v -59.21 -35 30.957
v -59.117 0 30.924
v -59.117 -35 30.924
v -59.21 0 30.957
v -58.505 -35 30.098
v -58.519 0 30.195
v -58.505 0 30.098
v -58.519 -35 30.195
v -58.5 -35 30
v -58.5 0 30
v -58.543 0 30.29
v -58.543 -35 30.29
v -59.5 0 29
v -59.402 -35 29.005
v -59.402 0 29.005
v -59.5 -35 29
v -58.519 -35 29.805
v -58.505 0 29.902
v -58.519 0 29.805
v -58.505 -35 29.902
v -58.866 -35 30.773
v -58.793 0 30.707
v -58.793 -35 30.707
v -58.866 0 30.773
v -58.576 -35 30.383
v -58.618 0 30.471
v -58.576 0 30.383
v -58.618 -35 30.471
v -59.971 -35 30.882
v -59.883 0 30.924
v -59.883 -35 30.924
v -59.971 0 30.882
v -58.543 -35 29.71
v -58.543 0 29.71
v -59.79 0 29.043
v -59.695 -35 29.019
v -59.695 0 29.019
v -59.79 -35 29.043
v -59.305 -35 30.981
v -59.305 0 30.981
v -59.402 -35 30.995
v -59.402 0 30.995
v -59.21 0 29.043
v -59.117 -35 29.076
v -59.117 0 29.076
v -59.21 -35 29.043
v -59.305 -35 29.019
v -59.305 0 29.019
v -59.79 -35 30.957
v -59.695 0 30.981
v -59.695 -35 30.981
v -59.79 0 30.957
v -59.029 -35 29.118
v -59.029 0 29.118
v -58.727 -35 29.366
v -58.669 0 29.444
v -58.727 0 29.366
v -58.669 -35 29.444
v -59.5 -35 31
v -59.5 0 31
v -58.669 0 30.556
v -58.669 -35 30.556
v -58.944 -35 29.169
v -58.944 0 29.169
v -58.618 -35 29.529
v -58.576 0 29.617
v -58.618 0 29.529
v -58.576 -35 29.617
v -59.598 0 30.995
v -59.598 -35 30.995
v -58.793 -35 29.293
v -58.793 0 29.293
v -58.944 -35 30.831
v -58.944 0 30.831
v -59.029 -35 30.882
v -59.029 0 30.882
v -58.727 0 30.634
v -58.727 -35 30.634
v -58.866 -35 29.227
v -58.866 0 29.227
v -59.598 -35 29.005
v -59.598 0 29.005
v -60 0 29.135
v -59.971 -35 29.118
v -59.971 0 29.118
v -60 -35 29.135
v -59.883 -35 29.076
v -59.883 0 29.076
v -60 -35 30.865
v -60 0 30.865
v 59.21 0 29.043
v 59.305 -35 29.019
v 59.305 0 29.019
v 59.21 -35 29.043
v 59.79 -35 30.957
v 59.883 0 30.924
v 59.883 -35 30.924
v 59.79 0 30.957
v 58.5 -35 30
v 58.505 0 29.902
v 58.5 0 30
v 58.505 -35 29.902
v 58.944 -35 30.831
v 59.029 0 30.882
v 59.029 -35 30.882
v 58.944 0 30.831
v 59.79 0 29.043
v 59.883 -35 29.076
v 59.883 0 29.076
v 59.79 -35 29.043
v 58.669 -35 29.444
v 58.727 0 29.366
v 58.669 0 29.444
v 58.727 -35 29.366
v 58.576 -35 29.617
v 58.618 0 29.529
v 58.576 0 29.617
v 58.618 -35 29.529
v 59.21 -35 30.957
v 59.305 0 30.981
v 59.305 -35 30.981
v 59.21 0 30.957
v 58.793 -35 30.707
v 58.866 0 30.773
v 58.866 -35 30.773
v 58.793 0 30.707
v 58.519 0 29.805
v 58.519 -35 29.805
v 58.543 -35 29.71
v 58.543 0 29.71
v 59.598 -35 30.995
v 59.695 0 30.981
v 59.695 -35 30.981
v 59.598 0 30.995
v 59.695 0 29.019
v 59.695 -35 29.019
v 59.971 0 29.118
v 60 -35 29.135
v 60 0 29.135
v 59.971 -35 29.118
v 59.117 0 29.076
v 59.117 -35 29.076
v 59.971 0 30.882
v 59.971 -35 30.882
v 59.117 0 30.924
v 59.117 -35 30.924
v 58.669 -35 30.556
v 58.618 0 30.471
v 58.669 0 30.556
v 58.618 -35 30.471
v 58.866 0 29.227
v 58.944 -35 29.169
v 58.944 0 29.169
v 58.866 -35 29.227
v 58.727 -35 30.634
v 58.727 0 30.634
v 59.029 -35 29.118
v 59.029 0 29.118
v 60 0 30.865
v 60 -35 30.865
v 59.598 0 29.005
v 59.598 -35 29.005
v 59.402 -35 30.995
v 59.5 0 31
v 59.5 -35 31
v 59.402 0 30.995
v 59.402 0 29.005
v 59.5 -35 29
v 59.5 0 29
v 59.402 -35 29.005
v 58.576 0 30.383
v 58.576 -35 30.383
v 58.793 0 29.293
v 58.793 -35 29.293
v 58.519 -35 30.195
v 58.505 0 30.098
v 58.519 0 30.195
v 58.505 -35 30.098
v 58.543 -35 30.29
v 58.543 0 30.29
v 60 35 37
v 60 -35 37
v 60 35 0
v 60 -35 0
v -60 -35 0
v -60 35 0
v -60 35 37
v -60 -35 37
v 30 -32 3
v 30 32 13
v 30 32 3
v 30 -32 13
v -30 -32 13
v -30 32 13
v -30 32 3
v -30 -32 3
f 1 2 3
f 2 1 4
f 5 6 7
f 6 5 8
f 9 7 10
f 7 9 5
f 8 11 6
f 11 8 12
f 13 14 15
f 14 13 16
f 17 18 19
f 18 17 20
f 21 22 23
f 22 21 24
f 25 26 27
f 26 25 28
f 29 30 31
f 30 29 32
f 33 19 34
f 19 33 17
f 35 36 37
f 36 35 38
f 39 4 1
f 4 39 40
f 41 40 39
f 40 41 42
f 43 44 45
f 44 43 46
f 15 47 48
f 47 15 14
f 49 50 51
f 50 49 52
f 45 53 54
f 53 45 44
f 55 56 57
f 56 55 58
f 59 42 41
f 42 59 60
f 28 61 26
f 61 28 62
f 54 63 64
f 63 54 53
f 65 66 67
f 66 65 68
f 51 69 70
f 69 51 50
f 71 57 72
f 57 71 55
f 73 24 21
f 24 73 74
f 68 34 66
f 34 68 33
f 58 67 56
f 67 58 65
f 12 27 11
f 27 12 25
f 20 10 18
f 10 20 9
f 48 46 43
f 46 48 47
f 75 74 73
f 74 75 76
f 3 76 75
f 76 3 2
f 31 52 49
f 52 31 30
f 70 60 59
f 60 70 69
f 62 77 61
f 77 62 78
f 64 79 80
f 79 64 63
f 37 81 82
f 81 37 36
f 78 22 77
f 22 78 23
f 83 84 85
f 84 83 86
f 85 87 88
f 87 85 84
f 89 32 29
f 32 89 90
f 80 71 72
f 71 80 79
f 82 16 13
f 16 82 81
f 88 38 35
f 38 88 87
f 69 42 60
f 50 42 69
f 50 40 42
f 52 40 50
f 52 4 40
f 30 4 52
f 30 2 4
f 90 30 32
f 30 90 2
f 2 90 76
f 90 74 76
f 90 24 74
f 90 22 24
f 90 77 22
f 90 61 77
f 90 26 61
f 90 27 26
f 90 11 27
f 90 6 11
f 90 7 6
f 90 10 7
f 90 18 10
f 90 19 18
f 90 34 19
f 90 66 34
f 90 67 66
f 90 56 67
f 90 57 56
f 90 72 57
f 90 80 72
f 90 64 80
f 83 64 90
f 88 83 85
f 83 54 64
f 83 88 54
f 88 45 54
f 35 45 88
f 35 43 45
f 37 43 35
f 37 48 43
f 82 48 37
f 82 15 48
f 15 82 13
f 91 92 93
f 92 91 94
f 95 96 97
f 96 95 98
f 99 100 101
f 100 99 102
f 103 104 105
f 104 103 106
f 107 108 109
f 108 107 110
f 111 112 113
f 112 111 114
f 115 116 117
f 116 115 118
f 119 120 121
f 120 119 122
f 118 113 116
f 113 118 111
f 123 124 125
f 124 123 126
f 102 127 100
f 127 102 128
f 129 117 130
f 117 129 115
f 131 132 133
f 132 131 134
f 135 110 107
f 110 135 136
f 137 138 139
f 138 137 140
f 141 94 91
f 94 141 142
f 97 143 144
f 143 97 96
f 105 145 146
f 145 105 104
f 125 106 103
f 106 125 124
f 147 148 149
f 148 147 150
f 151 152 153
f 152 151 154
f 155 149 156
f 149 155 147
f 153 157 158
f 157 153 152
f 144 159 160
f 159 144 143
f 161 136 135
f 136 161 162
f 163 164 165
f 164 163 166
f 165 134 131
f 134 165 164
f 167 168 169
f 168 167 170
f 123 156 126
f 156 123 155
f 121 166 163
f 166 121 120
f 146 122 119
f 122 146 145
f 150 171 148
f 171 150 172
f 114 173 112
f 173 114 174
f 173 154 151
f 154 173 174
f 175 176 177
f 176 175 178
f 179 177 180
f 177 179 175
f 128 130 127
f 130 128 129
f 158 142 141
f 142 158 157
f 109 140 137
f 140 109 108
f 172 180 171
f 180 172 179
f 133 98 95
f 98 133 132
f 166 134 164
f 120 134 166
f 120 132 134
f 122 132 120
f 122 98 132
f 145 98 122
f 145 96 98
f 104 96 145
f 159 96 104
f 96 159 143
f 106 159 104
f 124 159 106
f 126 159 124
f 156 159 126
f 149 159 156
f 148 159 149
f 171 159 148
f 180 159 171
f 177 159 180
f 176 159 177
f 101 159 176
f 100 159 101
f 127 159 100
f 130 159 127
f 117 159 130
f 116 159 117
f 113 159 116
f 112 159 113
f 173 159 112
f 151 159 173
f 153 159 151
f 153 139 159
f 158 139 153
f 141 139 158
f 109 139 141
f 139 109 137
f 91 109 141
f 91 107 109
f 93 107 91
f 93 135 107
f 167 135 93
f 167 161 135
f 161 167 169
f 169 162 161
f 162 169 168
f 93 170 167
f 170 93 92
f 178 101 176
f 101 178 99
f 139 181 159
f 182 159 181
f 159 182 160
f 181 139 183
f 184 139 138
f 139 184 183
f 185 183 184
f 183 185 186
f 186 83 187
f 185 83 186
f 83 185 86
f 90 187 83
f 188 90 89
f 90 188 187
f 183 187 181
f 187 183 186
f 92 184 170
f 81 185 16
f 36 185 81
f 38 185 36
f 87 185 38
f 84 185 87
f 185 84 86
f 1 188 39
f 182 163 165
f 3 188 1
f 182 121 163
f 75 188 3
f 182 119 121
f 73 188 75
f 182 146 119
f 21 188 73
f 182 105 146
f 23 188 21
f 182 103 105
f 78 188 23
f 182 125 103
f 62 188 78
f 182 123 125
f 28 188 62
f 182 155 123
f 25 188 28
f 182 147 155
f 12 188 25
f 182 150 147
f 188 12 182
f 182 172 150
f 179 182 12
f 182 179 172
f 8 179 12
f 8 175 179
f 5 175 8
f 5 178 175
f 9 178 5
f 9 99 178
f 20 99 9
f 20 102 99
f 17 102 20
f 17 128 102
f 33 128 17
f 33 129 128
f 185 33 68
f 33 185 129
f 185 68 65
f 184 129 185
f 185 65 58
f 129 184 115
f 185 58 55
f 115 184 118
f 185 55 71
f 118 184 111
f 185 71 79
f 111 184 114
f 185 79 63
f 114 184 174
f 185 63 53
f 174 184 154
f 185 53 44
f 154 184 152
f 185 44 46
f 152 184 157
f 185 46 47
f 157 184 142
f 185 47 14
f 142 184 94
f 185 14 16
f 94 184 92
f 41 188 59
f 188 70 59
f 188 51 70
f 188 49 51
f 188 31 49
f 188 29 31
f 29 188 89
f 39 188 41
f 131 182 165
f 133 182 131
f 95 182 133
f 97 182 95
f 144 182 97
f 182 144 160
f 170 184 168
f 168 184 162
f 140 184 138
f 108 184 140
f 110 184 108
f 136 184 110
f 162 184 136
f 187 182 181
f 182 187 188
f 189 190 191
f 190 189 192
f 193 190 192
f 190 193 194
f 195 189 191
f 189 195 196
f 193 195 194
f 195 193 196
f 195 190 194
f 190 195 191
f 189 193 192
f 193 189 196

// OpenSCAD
// Mini horizontal gel-electrophoresis box - buffer tank
// Print orientation: tank bottom on the bed (z = 0), opening upward.

$fn = 64;

// ---- Tank dimensions ----
tank_x = 120;   // outer length along X
tank_y = 70;    // outer width along Y (gel-tray span)
tank_z = 40;    // overall height

wall = 3;       // wall thickness
floor = 3;      // floor thickness under the chambers

// ---- Platform ----
plat_x = 60;    // platform length in X (centred)
plat_t = 10;    // platform thickness; top is at z = floor + plat_t = 13

// ---- Wire holes ----
hole_d = 2;     // electrode wire hole diameter
hole_y = 0;     // hole centre Y
hole_z = 30;    // hole centre Z
eps = 0.5;      // cutter overshoot past end walls

// ---- Derived ----
inner_h = tank_z - floor;              // chamber height above floor
cham_w  = tank_x - 2 * wall;           // chamber width at each end

difference() {
    // Outer tank body
    translate([-tank_x / 2, -tank_y / 2, 0])
        cube([tank_x, tank_y, tank_z]);

    // Open top (through the walls)
    translate([-tank_x / 2, -tank_y / 2, tank_z - wall])
        cube([tank_x, tank_y, wall + eps]);

    // Raised platform spanning the inner width
    translate([-plat_x / 2, -tank_y / 2 + wall, floor])
        cube([plat_x, tank_y - 2 * wall, plat_t]);

    // Horizontal wire holes along X through each end wall
    for (s = [-1, 1])
        translate([s * (tank_x / 2 - eps), hole_y, hole_z])
            rotate([90, 0, 0])
                cylinder(d = hole_d, h = tank_x + 2 * eps);
}
